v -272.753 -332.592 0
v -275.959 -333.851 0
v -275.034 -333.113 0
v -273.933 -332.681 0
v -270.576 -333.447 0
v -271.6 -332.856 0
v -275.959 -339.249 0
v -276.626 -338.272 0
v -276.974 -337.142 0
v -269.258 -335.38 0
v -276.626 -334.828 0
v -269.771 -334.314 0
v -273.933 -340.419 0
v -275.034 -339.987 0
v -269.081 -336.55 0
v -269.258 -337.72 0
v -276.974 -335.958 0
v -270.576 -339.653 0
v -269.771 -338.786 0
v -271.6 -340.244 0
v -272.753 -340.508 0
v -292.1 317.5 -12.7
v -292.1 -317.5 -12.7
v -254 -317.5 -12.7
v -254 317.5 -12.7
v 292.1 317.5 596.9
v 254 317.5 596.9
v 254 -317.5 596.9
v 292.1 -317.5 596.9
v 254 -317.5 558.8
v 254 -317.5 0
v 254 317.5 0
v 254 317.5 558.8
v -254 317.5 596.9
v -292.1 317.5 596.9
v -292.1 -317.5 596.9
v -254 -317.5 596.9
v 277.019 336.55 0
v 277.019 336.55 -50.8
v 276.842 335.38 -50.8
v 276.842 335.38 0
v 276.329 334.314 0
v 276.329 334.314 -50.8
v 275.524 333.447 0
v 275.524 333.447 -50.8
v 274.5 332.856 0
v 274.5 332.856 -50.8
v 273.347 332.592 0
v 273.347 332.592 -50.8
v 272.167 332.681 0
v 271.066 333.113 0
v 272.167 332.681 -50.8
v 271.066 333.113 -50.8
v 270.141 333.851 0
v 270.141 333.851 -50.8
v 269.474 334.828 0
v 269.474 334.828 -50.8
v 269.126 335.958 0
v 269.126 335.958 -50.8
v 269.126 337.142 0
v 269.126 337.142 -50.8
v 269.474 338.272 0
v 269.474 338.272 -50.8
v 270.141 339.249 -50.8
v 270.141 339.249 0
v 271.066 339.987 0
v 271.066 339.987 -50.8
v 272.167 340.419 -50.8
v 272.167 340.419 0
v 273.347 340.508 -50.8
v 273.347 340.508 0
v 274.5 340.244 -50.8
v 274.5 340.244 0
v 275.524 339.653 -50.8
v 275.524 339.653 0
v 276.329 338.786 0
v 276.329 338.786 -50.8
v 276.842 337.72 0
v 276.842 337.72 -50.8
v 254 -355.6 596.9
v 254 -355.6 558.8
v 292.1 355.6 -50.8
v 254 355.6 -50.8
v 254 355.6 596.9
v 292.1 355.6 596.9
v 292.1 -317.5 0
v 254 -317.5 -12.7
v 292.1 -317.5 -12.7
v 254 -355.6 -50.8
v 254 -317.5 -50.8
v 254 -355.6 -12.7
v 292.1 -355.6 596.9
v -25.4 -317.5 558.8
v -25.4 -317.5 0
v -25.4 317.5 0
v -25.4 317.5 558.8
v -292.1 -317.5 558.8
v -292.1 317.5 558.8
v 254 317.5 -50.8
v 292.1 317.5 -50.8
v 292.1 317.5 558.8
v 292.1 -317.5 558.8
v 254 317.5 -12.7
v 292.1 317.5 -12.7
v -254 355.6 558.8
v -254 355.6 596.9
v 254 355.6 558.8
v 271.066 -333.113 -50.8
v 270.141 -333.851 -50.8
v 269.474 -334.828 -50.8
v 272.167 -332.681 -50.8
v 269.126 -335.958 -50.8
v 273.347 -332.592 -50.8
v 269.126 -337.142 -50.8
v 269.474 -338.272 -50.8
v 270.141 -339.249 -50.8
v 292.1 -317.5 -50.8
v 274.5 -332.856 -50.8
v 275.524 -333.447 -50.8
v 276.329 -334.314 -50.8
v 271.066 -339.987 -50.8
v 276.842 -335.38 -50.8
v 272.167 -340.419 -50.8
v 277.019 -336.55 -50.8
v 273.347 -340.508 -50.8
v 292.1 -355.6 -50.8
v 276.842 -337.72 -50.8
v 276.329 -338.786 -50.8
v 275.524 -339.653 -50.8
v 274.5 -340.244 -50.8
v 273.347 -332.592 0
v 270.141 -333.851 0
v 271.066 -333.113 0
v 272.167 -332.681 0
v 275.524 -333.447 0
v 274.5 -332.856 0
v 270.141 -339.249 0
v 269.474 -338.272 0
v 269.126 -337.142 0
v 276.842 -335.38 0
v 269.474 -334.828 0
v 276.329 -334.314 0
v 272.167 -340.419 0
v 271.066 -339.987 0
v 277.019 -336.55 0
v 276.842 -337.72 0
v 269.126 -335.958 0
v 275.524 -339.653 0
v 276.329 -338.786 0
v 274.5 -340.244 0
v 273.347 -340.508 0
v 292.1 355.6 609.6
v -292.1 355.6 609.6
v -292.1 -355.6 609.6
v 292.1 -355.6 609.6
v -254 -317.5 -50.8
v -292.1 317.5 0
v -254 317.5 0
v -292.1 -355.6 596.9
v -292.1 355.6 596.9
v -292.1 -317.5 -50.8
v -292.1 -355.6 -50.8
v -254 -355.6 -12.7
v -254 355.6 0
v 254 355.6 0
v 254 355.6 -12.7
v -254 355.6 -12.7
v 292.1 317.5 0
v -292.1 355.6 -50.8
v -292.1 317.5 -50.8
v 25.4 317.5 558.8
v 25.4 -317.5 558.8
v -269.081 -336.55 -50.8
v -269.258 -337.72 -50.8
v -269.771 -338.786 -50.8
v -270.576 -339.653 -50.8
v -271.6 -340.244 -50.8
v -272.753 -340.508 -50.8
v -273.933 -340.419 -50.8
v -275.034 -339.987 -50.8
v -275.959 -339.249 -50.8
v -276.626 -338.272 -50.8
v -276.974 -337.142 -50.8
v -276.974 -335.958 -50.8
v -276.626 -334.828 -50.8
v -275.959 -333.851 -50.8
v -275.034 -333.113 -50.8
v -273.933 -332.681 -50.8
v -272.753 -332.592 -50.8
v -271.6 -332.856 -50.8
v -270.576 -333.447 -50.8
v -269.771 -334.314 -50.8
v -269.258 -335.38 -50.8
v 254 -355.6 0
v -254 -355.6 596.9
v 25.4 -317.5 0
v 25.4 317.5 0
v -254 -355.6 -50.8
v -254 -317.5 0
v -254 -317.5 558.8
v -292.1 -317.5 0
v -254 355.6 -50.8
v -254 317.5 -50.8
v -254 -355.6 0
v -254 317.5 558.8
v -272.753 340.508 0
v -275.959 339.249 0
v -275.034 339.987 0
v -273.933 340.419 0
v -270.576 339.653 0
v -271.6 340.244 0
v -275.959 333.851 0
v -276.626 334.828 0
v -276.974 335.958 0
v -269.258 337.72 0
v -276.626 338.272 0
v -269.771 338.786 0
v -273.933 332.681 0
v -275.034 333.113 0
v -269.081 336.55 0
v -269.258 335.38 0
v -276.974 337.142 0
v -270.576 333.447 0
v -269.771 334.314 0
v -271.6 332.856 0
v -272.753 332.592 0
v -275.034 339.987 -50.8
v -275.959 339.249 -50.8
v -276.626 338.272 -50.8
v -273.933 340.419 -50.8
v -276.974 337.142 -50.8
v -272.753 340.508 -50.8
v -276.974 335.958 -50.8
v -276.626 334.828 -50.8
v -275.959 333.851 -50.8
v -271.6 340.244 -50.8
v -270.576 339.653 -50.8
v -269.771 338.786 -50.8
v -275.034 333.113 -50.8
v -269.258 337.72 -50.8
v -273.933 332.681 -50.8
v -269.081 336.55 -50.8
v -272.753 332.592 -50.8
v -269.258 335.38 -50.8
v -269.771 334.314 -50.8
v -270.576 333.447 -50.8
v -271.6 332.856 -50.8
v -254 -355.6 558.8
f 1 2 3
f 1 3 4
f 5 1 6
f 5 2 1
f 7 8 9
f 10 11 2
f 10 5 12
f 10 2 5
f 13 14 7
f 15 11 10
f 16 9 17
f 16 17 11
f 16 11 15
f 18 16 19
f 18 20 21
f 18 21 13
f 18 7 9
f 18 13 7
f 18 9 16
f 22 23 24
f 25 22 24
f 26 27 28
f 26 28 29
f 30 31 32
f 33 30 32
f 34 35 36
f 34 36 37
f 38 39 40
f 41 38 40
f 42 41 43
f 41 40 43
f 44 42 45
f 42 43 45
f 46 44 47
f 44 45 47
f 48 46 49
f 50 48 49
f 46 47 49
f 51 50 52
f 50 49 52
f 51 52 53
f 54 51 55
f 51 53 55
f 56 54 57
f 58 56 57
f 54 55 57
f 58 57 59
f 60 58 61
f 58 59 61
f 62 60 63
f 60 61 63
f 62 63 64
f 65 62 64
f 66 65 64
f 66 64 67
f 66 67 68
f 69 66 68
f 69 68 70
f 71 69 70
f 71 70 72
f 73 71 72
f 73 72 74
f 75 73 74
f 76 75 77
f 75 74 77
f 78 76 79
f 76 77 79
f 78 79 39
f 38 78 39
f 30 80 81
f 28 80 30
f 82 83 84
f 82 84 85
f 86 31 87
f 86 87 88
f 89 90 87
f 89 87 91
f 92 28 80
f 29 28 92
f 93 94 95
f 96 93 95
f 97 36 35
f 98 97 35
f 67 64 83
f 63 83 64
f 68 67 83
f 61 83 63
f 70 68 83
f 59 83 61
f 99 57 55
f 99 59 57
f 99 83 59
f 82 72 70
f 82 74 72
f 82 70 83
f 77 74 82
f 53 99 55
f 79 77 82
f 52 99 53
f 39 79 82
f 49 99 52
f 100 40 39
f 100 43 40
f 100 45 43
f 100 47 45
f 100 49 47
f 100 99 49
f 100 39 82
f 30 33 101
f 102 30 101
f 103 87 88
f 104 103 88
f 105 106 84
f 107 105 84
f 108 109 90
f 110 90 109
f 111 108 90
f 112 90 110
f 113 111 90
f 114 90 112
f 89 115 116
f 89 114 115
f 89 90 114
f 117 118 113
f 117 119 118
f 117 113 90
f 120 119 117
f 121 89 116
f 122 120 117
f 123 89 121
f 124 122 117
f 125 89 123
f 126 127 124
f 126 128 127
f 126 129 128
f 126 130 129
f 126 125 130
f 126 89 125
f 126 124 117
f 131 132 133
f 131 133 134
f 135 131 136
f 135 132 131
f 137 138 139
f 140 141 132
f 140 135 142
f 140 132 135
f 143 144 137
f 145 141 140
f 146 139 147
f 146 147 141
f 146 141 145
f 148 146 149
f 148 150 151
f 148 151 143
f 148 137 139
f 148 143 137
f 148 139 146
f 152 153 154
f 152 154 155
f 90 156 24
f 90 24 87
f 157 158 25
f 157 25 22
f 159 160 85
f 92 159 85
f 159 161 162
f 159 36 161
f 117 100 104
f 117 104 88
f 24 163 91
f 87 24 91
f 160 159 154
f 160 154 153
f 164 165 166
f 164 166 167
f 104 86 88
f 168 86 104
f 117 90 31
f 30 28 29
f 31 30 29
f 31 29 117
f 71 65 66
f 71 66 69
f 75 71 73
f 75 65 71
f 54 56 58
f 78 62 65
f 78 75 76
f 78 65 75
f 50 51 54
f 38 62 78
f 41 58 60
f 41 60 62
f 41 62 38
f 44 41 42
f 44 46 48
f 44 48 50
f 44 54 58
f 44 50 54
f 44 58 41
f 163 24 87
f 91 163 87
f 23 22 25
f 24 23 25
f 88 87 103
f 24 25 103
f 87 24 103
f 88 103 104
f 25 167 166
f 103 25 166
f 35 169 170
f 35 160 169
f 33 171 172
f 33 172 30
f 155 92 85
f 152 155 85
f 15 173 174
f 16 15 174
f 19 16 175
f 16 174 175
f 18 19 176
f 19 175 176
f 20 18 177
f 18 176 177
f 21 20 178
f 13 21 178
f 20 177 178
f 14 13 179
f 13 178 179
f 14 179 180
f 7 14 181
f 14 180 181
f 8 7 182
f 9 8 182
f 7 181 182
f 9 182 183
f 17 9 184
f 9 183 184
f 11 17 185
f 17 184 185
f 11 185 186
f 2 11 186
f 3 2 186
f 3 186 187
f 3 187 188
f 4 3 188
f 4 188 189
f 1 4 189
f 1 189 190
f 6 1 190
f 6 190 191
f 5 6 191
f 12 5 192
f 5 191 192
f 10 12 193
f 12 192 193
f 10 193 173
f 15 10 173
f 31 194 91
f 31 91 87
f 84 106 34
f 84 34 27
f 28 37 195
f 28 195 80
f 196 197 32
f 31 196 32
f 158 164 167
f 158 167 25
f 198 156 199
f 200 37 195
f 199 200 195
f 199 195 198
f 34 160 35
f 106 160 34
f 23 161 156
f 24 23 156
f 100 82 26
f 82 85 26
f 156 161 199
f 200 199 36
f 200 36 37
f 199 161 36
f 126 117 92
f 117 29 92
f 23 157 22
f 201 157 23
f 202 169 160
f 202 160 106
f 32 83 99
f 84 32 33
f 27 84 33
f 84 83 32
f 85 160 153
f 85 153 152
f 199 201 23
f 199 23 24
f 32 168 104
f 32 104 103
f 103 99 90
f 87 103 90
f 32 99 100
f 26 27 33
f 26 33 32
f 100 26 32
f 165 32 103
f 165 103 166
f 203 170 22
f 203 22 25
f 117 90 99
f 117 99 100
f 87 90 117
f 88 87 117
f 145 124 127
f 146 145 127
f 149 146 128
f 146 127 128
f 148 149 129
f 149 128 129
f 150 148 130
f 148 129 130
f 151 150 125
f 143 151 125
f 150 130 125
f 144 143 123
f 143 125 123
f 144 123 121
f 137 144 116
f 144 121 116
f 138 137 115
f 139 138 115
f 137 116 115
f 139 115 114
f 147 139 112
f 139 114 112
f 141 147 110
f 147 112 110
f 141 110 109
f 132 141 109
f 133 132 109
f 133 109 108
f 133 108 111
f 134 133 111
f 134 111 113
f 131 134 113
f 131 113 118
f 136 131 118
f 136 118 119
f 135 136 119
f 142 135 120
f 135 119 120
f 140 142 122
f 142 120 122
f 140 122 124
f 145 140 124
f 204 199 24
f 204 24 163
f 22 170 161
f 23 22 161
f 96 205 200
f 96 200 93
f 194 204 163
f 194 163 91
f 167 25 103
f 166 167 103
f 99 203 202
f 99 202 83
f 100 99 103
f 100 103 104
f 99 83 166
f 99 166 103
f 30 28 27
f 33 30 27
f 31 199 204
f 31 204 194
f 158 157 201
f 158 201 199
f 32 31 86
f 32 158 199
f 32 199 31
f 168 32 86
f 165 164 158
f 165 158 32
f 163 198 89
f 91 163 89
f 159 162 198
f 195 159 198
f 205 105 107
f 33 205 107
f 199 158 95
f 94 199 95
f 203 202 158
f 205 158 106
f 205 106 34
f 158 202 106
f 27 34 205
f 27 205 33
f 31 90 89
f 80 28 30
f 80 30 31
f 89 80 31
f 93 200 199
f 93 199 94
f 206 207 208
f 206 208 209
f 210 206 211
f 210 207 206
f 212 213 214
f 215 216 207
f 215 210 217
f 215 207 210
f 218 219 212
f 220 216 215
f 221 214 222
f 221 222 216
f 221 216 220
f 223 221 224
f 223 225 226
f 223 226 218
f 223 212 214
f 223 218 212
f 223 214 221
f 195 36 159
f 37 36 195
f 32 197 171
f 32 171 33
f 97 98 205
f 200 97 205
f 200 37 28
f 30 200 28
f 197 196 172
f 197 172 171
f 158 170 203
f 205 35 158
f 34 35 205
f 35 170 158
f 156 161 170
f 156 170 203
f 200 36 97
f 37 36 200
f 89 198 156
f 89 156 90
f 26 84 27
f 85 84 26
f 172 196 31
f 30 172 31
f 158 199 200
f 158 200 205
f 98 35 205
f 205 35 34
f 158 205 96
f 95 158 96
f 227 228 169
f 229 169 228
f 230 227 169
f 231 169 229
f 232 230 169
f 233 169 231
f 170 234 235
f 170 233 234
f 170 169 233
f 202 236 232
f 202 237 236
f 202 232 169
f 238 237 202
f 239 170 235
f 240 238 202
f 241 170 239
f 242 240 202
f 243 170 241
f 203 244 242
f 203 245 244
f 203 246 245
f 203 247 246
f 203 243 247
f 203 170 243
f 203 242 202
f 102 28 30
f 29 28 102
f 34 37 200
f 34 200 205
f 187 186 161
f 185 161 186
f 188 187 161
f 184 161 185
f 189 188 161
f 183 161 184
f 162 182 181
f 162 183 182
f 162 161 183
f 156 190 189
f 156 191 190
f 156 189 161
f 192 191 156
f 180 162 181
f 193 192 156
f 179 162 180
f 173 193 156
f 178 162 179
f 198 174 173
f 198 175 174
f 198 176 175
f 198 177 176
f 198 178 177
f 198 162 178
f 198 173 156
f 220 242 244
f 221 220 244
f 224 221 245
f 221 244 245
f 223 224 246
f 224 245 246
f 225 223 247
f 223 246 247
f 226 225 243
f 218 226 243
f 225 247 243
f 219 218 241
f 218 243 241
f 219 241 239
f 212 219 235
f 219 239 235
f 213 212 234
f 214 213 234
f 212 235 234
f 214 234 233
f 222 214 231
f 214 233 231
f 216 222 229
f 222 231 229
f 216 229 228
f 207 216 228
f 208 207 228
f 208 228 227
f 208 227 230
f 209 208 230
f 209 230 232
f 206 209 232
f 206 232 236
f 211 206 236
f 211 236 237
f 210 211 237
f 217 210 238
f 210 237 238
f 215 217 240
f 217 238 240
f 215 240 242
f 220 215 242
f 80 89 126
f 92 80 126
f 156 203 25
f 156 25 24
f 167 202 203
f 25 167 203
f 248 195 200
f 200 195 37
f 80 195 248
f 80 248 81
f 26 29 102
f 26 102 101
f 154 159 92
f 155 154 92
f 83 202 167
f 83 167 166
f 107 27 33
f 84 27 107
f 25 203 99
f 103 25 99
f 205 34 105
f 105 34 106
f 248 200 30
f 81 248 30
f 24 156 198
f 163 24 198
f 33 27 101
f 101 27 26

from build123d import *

# Parameters (mm, degrees)
F0_W      = 228.6
F0_H      = 635
F1_DEPTH  = 558.8
F2_W      = 38.1
F2_H      = 38.1
F3_DEPTH  = 596.9
F3_FACE_W = 38.1
F3_FACE_H = 38.1
F4_DEPTH  = 50.8
F5_DEPTH  = 50.8
F6_DEPTH  = 50.8
F7_DEPTH  = 50.8
F9_DEPTH  = 12.7
F10_W     = 38.1
F10_H     = 635
F10_W_2   = 508
F10_H_2   = 38.1
F11_DEPTH = 38.1
F12_W     = 508
F12_H     = 38.1
F12_W_2   = 38.1
F12_H_2   = 635
F13_DEPTH = 38.1
F14_W     = 584.2
F14_H     = 711.2
F15_DEPTH = 12.7
F16_R     = 3.96875
F17_DEPTH = 50.8


with BuildPart() as f1:
    # F0 (on Top) → F1 (new body)
    with BuildSketch(Plane.XY):
        with Locations((139.7, 0)):
            Rectangle(F0_W, F0_H)
        with Locations((-139.7, 0)):
            Rectangle(F0_W, F0_H)
    extrude(amount=F1_DEPTH)



with BuildPart() as f3:
    # F2 (on Top) → F3 (new body)
    with BuildSketch(Plane.XY):
        with Locations((-273.05, 336.55)):
            Rectangle(F2_W, F2_H)
        with Locations((273.05, 336.55)):
            Rectangle(F2_W, F2_H)
        with Locations((273.05, -336.55)):
            Rectangle(F2_W, F2_H)
        with Locations((-273.05, -336.55)):
            Rectangle(F2_W, F2_H)
    extrude(amount=F3_DEPTH)


with BuildPart() as f1_1:
    add(f1.part)

    add(f3.part)  # F4 merges F3
    # F3_face (on face) → F4 (join)
    with BuildSketch(Plane(origin=(-273.05, -336.55, 0), x_dir=(1, 0, 0), z_dir=(0, 0, -1))):
        Rectangle(F3_FACE_W, F3_FACE_H)
    extrude(amount=F4_DEPTH)

    # F3_face (on face) → F5 (join)
    with BuildSketch(Plane(origin=(-273.05, -336.55, 0), x_dir=(1, 0, 0), z_dir=(0, 0, -1))):
        with Locations((546.1, 0)):
            Rectangle(F3_FACE_W, F3_FACE_H)
    extrude(amount=F5_DEPTH)

    # F3_face (on face) → F6 (join)
    with BuildSketch(Plane(origin=(-273.05, -336.55, 0), x_dir=(1, 0, 0), z_dir=(0, 0, -1))):
        with Locations((0, -673.1)):
            Rectangle(F3_FACE_W, F3_FACE_H)
    extrude(amount=F6_DEPTH)

    # F3_face (on face) → F7 (join)
    with BuildSketch(Plane(origin=(-273.05, -336.55, 0), x_dir=(1, 0, 0), z_dir=(0, 0, -1))):
        with Locations((546.1, -673.1)):
            Rectangle(F3_FACE_W, F3_FACE_H)
    extrude(amount=F7_DEPTH)

    # F16 (on face) → F17 (cut)
    with BuildSketch(Plane(origin=(0, 0, -50.8), x_dir=(1, 0, 0), z_dir=(0, 0, -1))):
        with Locations((273.05, -336.55)):
            Circle(F16_R)
        with Locations((-273.05, -336.55)):
            Circle(F16_R)
        with Locations((273.05, 336.55)):
            Circle(F16_R)
        with Locations((-273.05, 336.55)):
            Circle(F16_R)
    extrude(amount=-F17_DEPTH, mode=Mode.SUBTRACT)


with BuildPart() as f9:
    # F8 (on Top) → F9 (new body)
    with BuildSketch(Plane.XY):
        Polygon((-254, 317.5), (-292.1, 317.5), (-292.1, -317.5), (-254, -317.5), (-254, -355.6), (254, -355.6), (254, -317.5), (292.1, -317.5), (292.1, 317.5), (254, 317.5), (254, 355.6), (-254, 355.6), align=None)
    extrude(amount=-F9_DEPTH)


with BuildPart() as f11:
    # F10 (on face) → F11 (new body)
    with BuildSketch(Plane.XY.offset(596.9)):
        with Locations((273.05, 0)):
            Rectangle(F10_W, F10_H)
        with Locations((0, -336.55)):
            Rectangle(F10_W_2, F10_H_2)
        with Locations((-273.05, 0)):
            Rectangle(F10_W, F10_H)
        with Locations((0, 336.55)):
            Rectangle(F10_W_2, F10_H_2)
    extrude(amount=-F11_DEPTH)


with BuildPart() as f13:
    # F12 (on face) → F13 (new body)
    with BuildSketch(Plane(origin=(0, 0, -50.8), x_dir=(1, 0, 0), z_dir=(0, 0, -1))):
        with Locations((0, -336.55)):
            Rectangle(F12_W, F12_H)
        with Locations((273.05, 0)):
            Rectangle(F12_W_2, F12_H_2)
        with Locations((0, 336.55)):
            Rectangle(F12_W, F12_H)
        with Locations((-273.05, 0)):
            Rectangle(F12_W_2, F12_H_2)
    extrude(amount=-F13_DEPTH)


with BuildPart() as f15:
    # F14 (on face) → F15 (new body)
    with BuildSketch(Plane.XY.offset(596.9)):
        Rectangle(F14_W, F14_H)
    extrude(amount=F15_DEPTH)


solid = Compound([f1_1.part, f9.part, f11.part, f13.part, f15.part])
